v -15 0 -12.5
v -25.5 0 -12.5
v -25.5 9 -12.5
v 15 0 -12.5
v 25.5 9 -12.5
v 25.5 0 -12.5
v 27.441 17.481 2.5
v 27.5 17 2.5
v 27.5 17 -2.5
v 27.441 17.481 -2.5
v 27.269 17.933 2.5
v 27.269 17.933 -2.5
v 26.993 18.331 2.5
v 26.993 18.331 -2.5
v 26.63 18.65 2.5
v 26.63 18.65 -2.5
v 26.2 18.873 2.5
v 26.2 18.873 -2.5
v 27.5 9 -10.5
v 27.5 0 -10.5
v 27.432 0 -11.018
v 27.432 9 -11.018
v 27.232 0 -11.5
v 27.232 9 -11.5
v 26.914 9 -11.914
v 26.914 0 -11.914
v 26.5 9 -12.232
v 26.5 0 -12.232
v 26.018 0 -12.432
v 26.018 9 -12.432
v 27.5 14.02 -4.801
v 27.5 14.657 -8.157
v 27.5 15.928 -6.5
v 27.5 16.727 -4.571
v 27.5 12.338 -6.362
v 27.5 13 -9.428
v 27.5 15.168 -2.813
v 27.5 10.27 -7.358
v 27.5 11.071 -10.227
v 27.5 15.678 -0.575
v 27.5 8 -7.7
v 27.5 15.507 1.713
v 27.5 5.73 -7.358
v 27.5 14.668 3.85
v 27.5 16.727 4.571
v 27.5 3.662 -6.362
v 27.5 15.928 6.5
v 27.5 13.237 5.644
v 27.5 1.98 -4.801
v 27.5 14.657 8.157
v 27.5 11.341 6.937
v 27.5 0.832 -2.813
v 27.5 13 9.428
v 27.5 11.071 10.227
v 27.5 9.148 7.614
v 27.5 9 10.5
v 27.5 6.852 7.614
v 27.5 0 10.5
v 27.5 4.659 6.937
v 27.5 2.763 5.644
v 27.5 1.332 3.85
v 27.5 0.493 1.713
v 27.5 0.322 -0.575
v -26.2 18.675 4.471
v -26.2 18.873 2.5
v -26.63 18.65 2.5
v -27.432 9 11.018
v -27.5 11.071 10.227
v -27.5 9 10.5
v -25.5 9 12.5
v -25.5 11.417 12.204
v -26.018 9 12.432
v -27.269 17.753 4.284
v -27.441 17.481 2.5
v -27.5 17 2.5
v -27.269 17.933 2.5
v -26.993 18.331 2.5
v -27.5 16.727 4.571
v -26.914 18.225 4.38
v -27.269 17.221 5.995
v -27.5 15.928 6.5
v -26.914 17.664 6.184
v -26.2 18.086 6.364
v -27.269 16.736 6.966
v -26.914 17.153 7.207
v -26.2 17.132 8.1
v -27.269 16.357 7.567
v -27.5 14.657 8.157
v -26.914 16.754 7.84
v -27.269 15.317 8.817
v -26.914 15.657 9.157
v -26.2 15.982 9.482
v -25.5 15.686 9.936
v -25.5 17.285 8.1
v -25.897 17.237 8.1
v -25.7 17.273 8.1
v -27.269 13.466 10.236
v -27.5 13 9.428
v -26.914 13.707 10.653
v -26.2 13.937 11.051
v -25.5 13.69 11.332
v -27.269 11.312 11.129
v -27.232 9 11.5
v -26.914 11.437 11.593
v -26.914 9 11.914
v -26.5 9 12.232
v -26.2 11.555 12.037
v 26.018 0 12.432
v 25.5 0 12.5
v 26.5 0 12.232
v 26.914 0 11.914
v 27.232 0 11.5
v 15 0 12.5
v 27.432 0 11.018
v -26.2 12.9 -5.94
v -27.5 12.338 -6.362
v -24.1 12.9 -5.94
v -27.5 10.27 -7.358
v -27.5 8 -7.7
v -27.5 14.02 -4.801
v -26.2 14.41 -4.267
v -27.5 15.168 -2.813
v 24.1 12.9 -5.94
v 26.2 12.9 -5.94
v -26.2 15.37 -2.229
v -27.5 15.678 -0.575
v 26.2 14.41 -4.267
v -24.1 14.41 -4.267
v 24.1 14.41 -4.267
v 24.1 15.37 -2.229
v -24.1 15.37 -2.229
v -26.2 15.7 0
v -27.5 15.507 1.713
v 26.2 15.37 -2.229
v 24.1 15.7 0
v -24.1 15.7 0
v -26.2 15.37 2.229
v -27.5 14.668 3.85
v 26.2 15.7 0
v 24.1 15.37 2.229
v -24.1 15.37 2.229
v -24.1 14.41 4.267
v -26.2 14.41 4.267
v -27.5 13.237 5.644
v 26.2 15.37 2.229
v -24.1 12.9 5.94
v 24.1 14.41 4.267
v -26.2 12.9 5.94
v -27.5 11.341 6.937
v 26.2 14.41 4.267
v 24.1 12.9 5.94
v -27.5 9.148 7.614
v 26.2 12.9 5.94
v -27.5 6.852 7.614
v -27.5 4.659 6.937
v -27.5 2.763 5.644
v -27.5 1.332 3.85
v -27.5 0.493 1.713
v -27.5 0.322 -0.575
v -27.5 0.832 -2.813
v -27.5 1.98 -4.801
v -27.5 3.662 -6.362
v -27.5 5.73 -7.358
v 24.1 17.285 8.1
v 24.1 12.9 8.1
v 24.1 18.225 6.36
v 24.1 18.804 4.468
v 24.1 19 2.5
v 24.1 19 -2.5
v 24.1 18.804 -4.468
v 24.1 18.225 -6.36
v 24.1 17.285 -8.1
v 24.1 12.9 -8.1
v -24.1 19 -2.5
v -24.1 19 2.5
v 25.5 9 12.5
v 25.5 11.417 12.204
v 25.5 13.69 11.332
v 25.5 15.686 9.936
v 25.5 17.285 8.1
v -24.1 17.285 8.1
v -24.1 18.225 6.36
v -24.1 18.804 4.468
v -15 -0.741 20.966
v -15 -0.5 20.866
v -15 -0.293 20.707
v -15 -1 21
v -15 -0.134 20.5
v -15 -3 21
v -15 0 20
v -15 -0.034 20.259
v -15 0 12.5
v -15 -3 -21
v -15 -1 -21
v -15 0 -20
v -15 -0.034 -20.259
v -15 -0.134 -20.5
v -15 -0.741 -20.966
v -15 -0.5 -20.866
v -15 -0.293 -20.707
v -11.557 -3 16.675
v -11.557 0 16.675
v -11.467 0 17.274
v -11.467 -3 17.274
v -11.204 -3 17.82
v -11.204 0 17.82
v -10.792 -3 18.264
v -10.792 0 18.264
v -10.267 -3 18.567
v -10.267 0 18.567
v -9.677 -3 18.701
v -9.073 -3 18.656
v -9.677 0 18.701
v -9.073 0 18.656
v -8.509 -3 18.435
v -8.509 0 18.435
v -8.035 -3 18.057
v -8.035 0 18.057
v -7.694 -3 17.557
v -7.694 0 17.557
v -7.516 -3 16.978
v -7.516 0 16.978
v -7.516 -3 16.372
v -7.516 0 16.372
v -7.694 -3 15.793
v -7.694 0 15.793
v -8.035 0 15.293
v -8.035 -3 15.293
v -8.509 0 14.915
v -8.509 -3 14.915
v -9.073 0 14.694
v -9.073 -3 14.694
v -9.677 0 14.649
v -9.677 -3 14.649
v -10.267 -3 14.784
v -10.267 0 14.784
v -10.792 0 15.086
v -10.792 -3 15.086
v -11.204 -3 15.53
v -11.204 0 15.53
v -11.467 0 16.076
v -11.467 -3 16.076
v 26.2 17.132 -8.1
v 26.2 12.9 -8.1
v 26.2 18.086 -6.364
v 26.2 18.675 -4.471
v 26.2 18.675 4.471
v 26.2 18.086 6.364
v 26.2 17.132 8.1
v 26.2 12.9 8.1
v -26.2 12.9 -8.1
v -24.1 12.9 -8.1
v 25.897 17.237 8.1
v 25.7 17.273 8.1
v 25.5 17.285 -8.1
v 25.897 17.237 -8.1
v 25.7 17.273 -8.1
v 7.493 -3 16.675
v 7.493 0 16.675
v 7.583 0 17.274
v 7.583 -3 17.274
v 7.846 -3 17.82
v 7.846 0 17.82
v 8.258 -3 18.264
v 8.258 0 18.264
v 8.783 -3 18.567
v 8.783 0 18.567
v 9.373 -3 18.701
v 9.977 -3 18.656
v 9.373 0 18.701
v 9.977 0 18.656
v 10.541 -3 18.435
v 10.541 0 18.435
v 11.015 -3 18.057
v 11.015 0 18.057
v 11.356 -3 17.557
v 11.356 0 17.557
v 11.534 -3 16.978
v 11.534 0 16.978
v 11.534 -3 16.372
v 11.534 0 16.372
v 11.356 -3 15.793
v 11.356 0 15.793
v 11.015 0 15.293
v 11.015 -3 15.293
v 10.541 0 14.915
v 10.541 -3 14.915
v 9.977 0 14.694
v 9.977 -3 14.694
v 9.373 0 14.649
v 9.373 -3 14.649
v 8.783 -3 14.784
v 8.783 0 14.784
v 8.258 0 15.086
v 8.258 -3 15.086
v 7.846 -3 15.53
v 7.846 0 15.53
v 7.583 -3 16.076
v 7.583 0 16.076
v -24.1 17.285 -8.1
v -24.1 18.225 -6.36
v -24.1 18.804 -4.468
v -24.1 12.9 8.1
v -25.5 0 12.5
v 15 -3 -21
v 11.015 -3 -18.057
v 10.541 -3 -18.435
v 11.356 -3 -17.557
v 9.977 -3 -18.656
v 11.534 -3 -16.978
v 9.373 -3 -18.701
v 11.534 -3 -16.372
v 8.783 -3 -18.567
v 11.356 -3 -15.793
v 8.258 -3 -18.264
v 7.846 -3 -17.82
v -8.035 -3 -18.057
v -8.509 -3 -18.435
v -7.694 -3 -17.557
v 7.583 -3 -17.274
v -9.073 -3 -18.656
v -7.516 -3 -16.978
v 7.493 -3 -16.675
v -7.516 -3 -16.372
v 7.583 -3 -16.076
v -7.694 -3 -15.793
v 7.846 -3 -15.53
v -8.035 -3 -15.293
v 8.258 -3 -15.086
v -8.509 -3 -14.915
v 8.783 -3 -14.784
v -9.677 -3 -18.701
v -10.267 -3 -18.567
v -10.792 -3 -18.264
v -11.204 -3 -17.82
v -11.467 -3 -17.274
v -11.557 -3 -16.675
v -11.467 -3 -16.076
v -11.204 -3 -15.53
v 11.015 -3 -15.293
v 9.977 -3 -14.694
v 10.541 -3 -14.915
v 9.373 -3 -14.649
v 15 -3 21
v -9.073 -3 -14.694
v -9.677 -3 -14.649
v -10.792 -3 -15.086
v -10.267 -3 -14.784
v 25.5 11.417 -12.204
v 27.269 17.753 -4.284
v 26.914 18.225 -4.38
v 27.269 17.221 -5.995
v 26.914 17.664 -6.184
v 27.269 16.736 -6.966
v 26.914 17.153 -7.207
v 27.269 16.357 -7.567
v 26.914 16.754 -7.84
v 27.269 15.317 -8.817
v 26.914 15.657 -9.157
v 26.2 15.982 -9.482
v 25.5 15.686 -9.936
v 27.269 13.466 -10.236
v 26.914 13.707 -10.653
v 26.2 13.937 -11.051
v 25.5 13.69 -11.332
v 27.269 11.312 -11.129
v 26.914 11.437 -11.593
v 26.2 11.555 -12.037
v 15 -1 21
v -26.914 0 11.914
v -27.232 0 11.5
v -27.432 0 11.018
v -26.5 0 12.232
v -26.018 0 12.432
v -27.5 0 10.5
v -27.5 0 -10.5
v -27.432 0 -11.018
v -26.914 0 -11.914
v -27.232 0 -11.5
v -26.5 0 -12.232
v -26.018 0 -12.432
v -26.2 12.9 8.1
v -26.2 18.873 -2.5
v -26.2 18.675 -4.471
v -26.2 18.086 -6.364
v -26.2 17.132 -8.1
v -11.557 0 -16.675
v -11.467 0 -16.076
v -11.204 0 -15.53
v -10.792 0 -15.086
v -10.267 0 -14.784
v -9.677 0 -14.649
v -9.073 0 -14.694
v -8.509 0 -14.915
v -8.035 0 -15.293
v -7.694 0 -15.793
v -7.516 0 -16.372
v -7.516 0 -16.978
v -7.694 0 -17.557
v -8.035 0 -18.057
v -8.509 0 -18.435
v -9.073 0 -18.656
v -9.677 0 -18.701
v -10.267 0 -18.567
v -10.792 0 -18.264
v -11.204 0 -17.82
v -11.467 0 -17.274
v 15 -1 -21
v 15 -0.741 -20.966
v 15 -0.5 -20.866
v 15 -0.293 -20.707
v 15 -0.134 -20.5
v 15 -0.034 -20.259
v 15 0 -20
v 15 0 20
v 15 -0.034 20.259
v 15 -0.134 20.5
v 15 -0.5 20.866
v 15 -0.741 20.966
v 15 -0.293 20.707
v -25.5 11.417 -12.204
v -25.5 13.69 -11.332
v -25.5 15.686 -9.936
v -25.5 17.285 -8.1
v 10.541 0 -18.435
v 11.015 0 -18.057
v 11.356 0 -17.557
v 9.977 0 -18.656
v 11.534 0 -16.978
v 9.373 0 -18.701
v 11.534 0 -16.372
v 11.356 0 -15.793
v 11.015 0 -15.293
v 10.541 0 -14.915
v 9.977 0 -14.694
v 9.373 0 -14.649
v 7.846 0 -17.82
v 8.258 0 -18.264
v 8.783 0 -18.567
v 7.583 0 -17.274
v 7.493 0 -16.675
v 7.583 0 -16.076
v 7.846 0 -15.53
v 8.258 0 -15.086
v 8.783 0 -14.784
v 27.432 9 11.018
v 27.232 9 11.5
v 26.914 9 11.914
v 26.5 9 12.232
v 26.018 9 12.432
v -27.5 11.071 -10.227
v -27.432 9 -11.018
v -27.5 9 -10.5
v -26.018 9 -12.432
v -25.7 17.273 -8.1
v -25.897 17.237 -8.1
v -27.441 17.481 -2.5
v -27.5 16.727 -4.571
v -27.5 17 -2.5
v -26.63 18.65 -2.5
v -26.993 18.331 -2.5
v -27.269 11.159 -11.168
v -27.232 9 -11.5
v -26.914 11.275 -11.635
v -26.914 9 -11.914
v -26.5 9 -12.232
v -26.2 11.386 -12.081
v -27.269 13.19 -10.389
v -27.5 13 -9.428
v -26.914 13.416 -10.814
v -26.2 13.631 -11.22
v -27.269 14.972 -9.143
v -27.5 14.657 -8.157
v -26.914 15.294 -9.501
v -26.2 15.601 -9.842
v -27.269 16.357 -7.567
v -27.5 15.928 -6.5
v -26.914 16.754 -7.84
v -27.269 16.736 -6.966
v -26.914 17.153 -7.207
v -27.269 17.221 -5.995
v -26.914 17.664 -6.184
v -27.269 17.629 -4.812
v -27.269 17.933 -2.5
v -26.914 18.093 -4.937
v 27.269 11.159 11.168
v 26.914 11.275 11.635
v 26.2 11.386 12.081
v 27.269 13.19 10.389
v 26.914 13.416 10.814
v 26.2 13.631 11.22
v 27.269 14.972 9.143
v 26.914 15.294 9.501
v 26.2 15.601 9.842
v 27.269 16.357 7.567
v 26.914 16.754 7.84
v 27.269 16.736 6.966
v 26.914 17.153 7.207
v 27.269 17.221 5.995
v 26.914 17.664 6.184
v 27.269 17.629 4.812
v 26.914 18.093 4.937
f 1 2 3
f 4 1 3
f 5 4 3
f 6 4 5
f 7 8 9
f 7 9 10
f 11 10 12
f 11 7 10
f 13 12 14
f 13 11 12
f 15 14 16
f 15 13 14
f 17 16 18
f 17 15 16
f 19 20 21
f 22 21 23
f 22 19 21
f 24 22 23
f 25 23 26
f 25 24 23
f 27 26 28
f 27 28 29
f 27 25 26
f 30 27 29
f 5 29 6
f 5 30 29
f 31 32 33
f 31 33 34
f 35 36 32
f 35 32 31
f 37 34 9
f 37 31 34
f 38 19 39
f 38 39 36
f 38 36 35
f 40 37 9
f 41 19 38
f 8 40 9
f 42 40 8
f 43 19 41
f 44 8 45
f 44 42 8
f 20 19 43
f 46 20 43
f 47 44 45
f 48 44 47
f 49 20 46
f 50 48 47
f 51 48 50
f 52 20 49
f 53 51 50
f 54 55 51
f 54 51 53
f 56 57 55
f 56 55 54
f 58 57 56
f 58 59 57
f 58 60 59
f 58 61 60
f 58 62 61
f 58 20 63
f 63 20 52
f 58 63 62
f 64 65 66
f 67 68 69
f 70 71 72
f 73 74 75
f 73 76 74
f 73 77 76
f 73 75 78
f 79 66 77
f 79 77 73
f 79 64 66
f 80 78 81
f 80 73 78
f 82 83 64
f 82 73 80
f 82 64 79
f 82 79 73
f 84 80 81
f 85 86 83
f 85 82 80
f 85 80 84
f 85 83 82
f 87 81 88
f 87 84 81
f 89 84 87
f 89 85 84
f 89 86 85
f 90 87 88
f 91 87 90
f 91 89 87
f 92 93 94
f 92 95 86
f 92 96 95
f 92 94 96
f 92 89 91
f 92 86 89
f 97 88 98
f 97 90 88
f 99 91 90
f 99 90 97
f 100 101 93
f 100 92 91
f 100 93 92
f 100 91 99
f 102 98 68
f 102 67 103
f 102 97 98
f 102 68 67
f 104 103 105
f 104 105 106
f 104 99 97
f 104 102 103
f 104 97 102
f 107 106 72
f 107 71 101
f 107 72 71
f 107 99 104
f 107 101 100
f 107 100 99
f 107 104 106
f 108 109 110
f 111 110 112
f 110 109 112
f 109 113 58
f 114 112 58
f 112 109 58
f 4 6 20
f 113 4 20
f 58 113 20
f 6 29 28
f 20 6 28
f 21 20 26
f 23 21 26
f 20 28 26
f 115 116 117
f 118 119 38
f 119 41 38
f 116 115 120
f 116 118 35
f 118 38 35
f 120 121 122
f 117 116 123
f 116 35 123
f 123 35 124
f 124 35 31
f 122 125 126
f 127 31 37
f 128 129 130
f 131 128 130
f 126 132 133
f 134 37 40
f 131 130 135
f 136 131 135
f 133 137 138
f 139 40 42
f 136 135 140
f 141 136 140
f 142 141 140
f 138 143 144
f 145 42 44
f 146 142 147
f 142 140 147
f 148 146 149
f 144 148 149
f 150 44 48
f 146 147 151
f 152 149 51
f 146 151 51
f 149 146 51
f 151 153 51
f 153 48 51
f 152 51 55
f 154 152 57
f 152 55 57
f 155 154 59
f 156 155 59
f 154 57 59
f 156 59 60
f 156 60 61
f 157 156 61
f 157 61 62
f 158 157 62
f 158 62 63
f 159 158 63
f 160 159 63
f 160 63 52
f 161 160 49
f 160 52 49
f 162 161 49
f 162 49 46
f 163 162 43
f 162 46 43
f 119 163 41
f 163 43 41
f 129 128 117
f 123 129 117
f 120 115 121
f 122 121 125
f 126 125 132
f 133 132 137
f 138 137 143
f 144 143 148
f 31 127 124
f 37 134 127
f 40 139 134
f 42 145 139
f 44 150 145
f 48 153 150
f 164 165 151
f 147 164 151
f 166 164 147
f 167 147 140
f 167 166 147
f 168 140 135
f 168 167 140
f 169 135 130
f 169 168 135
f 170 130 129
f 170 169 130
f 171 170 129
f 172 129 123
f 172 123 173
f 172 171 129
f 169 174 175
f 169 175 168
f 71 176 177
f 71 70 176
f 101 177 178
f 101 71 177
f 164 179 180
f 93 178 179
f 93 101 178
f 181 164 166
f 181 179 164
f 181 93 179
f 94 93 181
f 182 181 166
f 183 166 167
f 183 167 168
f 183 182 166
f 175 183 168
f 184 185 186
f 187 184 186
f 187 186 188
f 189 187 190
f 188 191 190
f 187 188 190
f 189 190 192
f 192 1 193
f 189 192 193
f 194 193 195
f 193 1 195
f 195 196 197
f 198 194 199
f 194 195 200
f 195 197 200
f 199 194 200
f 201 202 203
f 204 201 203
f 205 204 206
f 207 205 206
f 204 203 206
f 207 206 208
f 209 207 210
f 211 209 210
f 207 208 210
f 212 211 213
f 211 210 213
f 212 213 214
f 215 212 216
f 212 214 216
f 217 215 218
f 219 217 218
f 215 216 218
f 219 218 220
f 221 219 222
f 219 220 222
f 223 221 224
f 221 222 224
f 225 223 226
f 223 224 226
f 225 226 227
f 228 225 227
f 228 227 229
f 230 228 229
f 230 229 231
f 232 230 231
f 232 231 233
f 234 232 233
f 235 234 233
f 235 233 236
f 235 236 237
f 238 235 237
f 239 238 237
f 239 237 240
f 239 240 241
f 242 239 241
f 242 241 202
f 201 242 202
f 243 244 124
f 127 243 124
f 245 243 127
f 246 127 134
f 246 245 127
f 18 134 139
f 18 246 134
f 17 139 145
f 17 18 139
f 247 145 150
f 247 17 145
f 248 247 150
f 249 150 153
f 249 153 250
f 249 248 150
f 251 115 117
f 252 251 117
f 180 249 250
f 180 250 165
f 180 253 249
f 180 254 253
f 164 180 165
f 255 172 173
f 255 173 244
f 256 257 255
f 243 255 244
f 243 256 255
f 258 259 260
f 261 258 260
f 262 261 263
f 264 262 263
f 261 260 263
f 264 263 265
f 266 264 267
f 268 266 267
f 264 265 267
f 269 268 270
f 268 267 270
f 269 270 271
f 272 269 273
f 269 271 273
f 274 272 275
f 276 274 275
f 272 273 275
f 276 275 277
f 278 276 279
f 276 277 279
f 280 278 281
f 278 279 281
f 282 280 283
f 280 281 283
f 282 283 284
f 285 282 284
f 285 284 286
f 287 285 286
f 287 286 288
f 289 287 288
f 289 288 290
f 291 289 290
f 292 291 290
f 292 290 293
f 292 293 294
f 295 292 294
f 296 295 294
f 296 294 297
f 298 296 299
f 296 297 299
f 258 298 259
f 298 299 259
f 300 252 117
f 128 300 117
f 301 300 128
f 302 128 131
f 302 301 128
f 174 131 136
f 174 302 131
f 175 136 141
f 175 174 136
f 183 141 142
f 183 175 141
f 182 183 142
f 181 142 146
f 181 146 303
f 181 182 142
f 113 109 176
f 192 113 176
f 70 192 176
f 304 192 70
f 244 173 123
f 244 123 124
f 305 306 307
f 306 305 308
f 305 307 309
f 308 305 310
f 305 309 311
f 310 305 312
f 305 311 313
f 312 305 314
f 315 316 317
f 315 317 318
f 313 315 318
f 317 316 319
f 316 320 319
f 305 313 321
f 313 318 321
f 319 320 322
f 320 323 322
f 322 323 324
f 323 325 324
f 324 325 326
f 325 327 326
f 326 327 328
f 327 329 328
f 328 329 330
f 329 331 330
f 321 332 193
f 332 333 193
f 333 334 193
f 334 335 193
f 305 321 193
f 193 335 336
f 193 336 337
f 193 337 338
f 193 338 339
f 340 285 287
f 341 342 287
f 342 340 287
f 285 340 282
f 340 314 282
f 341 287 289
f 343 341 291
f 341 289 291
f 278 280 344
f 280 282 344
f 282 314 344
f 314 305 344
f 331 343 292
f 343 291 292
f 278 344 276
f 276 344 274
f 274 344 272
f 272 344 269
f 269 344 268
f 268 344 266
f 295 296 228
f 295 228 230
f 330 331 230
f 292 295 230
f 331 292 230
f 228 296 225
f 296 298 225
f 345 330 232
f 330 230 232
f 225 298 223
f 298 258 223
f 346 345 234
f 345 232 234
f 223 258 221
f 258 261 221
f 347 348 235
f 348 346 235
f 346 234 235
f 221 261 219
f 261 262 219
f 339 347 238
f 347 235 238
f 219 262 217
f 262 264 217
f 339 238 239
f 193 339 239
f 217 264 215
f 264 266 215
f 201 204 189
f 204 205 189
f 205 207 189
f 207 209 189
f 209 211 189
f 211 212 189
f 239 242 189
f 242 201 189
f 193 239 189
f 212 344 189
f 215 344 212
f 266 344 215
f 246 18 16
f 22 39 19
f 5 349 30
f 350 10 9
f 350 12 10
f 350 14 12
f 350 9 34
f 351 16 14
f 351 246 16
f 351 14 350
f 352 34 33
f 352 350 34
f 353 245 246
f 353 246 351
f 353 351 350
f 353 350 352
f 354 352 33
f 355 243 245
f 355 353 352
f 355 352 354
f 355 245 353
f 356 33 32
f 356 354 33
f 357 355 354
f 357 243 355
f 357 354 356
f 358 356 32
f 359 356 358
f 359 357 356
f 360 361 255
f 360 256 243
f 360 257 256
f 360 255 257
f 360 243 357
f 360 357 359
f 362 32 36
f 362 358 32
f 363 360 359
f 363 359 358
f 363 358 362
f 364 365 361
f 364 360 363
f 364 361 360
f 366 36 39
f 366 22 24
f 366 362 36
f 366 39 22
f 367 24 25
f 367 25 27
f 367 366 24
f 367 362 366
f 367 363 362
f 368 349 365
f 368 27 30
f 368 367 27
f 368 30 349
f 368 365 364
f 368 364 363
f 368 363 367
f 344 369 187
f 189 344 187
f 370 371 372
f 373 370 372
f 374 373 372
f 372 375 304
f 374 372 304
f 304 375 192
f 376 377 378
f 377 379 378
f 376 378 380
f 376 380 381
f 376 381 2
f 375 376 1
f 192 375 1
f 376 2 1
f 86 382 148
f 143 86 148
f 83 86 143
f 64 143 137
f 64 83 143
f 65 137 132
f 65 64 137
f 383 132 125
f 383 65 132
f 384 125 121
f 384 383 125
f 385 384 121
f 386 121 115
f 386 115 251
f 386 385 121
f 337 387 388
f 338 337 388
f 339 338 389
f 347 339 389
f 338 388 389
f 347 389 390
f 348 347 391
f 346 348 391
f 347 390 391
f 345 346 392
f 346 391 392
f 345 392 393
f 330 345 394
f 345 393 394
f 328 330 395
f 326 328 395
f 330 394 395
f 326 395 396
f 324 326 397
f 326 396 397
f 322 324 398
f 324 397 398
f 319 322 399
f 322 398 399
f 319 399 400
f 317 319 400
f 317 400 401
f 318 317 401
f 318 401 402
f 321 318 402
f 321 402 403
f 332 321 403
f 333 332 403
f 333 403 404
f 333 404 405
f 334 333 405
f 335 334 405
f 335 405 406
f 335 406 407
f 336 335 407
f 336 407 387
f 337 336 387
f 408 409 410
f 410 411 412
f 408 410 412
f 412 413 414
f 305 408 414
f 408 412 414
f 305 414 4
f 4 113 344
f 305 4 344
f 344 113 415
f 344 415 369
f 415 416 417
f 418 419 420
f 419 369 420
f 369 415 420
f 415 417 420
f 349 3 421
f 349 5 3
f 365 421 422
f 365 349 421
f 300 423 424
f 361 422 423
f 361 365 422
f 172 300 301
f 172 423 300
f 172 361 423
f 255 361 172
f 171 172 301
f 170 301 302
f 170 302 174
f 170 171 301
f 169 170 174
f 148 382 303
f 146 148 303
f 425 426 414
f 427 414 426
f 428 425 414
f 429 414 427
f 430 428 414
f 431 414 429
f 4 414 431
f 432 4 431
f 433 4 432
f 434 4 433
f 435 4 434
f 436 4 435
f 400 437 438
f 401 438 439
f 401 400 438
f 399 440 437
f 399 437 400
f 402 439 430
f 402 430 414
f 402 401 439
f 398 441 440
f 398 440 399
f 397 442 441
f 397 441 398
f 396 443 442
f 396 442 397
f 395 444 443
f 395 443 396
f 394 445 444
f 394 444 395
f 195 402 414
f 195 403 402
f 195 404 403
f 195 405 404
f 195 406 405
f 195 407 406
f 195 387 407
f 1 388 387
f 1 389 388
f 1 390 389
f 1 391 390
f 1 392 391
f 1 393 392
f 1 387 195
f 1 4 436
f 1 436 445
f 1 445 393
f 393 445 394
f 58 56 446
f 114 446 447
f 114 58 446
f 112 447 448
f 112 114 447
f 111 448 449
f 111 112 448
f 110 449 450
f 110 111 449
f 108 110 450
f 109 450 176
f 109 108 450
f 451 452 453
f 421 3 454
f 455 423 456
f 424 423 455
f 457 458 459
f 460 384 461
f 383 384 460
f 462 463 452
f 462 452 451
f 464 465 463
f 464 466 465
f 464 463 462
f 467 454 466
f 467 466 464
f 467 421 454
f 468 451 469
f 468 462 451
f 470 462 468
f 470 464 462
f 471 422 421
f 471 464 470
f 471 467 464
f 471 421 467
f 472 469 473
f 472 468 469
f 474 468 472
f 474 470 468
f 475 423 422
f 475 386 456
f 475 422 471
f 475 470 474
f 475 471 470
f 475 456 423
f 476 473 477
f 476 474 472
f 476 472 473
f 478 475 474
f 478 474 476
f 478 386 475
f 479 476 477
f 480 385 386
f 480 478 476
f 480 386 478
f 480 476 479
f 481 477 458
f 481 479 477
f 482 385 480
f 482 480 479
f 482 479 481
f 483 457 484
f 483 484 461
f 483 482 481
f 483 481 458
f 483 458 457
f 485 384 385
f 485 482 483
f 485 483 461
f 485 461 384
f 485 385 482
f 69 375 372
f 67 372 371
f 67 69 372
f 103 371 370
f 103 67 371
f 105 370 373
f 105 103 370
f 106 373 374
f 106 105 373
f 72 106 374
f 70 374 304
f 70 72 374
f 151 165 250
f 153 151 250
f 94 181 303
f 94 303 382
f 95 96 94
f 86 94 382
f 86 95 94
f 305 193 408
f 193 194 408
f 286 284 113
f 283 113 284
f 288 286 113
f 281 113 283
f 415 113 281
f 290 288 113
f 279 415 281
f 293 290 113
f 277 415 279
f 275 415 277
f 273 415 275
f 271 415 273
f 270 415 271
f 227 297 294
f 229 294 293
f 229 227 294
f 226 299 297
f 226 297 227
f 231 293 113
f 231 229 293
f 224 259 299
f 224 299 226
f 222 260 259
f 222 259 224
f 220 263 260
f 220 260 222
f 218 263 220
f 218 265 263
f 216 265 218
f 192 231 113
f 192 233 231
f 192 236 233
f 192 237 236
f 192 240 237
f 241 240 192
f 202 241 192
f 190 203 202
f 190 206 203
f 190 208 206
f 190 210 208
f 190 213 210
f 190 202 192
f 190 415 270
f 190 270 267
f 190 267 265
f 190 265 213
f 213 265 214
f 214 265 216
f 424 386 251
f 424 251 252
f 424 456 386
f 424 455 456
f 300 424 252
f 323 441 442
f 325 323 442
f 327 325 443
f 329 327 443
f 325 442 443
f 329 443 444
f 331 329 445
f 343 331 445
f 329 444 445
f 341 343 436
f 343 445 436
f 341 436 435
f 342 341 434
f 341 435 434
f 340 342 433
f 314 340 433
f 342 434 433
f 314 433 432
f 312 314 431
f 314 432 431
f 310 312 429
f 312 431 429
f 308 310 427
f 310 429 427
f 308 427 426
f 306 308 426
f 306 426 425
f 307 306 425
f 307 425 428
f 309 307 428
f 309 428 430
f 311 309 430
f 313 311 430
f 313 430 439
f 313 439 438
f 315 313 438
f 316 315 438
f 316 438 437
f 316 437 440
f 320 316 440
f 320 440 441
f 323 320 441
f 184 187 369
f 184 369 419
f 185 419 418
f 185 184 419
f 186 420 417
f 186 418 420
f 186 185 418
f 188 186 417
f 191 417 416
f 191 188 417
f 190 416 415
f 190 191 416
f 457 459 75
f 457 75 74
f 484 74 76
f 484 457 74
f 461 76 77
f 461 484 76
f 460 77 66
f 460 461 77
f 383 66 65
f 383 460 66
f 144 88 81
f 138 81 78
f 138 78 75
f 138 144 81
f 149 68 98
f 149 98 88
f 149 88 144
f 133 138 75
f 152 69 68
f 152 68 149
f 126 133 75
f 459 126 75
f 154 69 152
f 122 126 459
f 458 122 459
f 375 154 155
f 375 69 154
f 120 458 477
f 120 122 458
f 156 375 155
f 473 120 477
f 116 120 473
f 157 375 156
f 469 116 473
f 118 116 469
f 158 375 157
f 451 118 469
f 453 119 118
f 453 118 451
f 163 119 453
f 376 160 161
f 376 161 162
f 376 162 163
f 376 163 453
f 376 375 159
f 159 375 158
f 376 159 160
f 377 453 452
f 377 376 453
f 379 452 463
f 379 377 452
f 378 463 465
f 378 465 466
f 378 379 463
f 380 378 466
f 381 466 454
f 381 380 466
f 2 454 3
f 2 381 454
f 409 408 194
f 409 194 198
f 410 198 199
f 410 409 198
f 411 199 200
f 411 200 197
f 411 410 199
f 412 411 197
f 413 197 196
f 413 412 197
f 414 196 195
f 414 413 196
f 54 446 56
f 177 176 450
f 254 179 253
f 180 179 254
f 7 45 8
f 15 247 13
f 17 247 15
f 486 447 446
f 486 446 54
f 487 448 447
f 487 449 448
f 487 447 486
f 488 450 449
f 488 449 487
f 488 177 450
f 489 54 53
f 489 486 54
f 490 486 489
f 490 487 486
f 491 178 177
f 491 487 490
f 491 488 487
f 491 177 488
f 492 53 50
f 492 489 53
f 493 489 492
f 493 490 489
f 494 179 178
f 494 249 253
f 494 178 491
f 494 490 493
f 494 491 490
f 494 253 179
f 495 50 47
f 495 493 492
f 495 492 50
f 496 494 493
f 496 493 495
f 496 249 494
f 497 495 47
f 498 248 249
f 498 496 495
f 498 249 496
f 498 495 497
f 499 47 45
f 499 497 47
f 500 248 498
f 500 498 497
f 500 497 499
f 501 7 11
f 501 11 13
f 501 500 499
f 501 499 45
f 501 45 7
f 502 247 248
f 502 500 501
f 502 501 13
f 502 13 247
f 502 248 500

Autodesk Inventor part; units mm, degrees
ref_plane "YZ Plane" through (0, 0, 0) normal (1, 0, 0) x (0, 1, 0)
ref_plane "XZ Plane" through (0, 0, 0) normal (0, 1, 0) x (-1, 0, 0)
sketch "Sketch1" plane through (0, 0, 0) normal (0, 1, 0) x (-1, 0, 0)
  line L0 (-15, 21) -> (15, 21)
  line L1 (15, 21) -> (15, -21)
  line L2 (15, -21) -> (-15, -21)
  line L3 (-15, -21) -> (-15, 21)
  line L4 (-15, 21) -> (15, -21) construction
  line L5 (15, 21) -> (-15, -21) construction
  line L6 (-9.525, 16.6751) -> (9.525, 16.6751) construction
  line L7 (9.525, 16.6751) -> (9.525, -16.6751) construction
  line L8 (9.525, -16.6751) -> (-9.525, -16.6751) construction
  line L9 (-9.525, -16.6751) -> (-9.525, 16.6751) construction
  line L10 (-9.525, 16.6751) -> (9.525, -16.6751) construction
  line L11 (9.525, 16.6751) -> (-9.525, -16.6751) construction
  circle A0 centre (9.525, 16.6751) radius 2.032
  circle A1 centre (-9.525, -16.6751) radius 2.032
  circle A2 centre (9.525, -16.6751) radius 2.032
  circle A3 centre (-9.525, 16.6751) radius 2.032
  point P0 (0, 0)
  dimension "d0" = 30
  dimension "d1" = 42
  dimension "d2" = 33.3502
  dimension "d3" = 19.05
  dimension "d6" = 4.064
  dimension "d7" = 4.064
  dimension "d36" = 4.064
  dimension "d37" = 4.064
extrude "Extrusion1" add sketch "Sketch1" against normal blind 3
sketch "Sketch2" plane through (0, 0, 0) normal (0, 1, 0) x (1, 0, 0)
  line L0 (27.5, -12.5) -> (-27.5, -12.5)
  line L1 (-27.5, -12.5) -> (-27.5, 12.5)
  line L2 (-27.5, 12.5) -> (27.5, 12.5)
  line L3 (27.5, 12.5) -> (27.5, -12.5)
  line L4 (27.5, -12.5) -> (-27.5, 12.5) construction
  line L5 (-27.5, -12.5) -> (27.5, 12.5) construction
  point P0 (0, 0)
  point P1 (0, 0)
  point P2 (0, 0)
  dimension "d9" = 25
  dimension "d13" = 55
extrude "Extrusion2" add sketch "Sketch2" along normal blind 19
sketch "Sketch3" plane through (27.5, 0, 12.5) normal (1, 0, 0) x (0, 0, -1)
  line L0 (25, 0) -> (0, 0) projected
  line L1 (25, 0) -> (25, 19) projected
  line L2 (0, 19) -> (25, 19) projected
  line L3 (0, 0) -> (0, 19) projected
  line L4 (33.5, 0) -> (25, 0) projected
  line L5 (25, 0) -> (0, 0) projected
  line L6 (0, 0) -> (-8.5, 0) projected
  line L7 (-8.5, 0) -> (-8.5, -3) projected
  line L8 (33.5, -3) -> (-8.5, -3) projected
  line L9 (33.5, 0) -> (33.5, -3) projected
  circle A0 centre (12.5, 8) radius 7.7
  point P0 (12.5, 0)
  point P1 (12.5, 0)
  point P2 (12.5, 0)
  dimension "d12" = 15.4
  dimension "d28" = 11
extrude "Extrusion3" cut sketch "Sketch3" against normal through all contours A0
fillet "Fillet1" radius 10 2 edges at (0, 19, -12.5) (0, 19, 12.5)
fillet "Fillet2" radius 2 10 edges at (27.5, 19, 0) (27.5, 16.0711, -9.5711) (27.5, 4.5, -12.5) (27.5, 4.5, 12.5) (27.5, 16.0711, 9.5711) (-27.5, 19, 0) (-27.5, 16.0711, 9.5711) (-27.5, 4.5, 12.5) (-27.5, 4.5, -12.5) (-27.5, 16.0711, -9.5711)
fillet "Fillet3" radius 1 2 edges at (0, 0, 21) (0, 0, -21)
sketch "Sketch4" plane through (0, 19, 0) normal (0, 1, 0) x (1, 0, 0)
  line L0 (26.2, -8.1) -> (24.1, -8.1)
  line L1 (24.1, -8.1) -> (24.1, 8.1)
  line L2 (24.1, 8.1) -> (26.2, 8.1)
  line L3 (26.2, 8.1) -> (26.2, -8.1)
  line L4 (25.5, -2.5) -> (-25.5, -2.5) projected
  line L5 (-25.5, 2.5) -> (25.5, 2.5) projected
  line L6 (-25.5, -2.5) -> (-25.5, 2.5) projected
  line L7 (25.5, 2.5) -> (25.5, -2.5) projected
  point P0 (0, 0)
  dimension "d16" = 24.1
  dimension "d18" = 2.1
  dimension "d34" = 8.1
  dimension "d35" = 8.1
extrude "Extrusion4" cut sketch "Sketch4" against normal blind 6.1 contours L0 L1 L4 L7 L5 L2 L3 | L1 L5 L7 L4
ref_plane "Work Plane1" through (0, 0, 10.5) normal (1, 0, 0) x (0, 0, -1)
mirror "Mirror1" about plane through (0, 0, 10.5) normal (1, 0, 0) of "Extrusion4"
sketch "Sketch5" plane through (0, 12.9, 0) normal (0, 1, 0) x (1, 0, 0)
  line L0 (26.2, 9.4632) -> (26.2, -9.4632) projected
  line L1 (24.1, -9.6414) -> (24.1, 9.6414) projected
  line L2 (-24.1, 9.6414) -> (-24.1, -9.6414) projected
  line L3 (-26.2, -9.4632) -> (-26.2, 9.4632) projected
  line L4 (26.2, -9.5) -> (24.1, -9.5)
  line L5 (24.1, -9.5) -> (24.1, 9.5)
  line L6 (24.1, 9.5) -> (26.2, 9.5)
  line L7 (26.2, 9.5) -> (26.2, -9.5)
  line L8 (-24.1, -9.5) -> (-26.2, -9.5)
  line L9 (-26.2, -9.5) -> (-26.2, 9.5)
  line L10 (-26.2, 9.5) -> (-24.1, 9.5)
  line L11 (-24.1, 9.5) -> (-24.1, -9.5)
  line L12 (-25.5, 9.6414) -> (-24.1, 9.6414) projected
  line L13 (-24.1, -9.6414) -> (-25.5, -9.6414) projected
  line L14 (-25.5, 9.6414) -> (-24.1, 9.6414) projected
  line L15 (-24.1, -9.6414) -> (-25.5, -9.6414) projected
  line L16 (24.1, 9.6414) -> (25.5, 9.6414) projected
  line L17 (24.1, -9.6414) -> (24.1, 9.6414) projected
  line L18 (25.5, -9.6414) -> (24.1, -9.6414) projected
  line L19 (26.2, 9.4632) -> (26.2, -9.4632) projected
  line L20 (24.1, 9.6414) -> (25.5, 9.6414) projected
  line L21 (25.5, -9.6414) -> (24.1, -9.6414) projected
  line L22 (-24.1, 9.6414) -> (-24.1, -9.6414) projected
  line L23 (-26.2, -9.4632) -> (-26.2, 9.4632) projected
  point P0 (0, 0)
properties part number "slave-slider-house"
